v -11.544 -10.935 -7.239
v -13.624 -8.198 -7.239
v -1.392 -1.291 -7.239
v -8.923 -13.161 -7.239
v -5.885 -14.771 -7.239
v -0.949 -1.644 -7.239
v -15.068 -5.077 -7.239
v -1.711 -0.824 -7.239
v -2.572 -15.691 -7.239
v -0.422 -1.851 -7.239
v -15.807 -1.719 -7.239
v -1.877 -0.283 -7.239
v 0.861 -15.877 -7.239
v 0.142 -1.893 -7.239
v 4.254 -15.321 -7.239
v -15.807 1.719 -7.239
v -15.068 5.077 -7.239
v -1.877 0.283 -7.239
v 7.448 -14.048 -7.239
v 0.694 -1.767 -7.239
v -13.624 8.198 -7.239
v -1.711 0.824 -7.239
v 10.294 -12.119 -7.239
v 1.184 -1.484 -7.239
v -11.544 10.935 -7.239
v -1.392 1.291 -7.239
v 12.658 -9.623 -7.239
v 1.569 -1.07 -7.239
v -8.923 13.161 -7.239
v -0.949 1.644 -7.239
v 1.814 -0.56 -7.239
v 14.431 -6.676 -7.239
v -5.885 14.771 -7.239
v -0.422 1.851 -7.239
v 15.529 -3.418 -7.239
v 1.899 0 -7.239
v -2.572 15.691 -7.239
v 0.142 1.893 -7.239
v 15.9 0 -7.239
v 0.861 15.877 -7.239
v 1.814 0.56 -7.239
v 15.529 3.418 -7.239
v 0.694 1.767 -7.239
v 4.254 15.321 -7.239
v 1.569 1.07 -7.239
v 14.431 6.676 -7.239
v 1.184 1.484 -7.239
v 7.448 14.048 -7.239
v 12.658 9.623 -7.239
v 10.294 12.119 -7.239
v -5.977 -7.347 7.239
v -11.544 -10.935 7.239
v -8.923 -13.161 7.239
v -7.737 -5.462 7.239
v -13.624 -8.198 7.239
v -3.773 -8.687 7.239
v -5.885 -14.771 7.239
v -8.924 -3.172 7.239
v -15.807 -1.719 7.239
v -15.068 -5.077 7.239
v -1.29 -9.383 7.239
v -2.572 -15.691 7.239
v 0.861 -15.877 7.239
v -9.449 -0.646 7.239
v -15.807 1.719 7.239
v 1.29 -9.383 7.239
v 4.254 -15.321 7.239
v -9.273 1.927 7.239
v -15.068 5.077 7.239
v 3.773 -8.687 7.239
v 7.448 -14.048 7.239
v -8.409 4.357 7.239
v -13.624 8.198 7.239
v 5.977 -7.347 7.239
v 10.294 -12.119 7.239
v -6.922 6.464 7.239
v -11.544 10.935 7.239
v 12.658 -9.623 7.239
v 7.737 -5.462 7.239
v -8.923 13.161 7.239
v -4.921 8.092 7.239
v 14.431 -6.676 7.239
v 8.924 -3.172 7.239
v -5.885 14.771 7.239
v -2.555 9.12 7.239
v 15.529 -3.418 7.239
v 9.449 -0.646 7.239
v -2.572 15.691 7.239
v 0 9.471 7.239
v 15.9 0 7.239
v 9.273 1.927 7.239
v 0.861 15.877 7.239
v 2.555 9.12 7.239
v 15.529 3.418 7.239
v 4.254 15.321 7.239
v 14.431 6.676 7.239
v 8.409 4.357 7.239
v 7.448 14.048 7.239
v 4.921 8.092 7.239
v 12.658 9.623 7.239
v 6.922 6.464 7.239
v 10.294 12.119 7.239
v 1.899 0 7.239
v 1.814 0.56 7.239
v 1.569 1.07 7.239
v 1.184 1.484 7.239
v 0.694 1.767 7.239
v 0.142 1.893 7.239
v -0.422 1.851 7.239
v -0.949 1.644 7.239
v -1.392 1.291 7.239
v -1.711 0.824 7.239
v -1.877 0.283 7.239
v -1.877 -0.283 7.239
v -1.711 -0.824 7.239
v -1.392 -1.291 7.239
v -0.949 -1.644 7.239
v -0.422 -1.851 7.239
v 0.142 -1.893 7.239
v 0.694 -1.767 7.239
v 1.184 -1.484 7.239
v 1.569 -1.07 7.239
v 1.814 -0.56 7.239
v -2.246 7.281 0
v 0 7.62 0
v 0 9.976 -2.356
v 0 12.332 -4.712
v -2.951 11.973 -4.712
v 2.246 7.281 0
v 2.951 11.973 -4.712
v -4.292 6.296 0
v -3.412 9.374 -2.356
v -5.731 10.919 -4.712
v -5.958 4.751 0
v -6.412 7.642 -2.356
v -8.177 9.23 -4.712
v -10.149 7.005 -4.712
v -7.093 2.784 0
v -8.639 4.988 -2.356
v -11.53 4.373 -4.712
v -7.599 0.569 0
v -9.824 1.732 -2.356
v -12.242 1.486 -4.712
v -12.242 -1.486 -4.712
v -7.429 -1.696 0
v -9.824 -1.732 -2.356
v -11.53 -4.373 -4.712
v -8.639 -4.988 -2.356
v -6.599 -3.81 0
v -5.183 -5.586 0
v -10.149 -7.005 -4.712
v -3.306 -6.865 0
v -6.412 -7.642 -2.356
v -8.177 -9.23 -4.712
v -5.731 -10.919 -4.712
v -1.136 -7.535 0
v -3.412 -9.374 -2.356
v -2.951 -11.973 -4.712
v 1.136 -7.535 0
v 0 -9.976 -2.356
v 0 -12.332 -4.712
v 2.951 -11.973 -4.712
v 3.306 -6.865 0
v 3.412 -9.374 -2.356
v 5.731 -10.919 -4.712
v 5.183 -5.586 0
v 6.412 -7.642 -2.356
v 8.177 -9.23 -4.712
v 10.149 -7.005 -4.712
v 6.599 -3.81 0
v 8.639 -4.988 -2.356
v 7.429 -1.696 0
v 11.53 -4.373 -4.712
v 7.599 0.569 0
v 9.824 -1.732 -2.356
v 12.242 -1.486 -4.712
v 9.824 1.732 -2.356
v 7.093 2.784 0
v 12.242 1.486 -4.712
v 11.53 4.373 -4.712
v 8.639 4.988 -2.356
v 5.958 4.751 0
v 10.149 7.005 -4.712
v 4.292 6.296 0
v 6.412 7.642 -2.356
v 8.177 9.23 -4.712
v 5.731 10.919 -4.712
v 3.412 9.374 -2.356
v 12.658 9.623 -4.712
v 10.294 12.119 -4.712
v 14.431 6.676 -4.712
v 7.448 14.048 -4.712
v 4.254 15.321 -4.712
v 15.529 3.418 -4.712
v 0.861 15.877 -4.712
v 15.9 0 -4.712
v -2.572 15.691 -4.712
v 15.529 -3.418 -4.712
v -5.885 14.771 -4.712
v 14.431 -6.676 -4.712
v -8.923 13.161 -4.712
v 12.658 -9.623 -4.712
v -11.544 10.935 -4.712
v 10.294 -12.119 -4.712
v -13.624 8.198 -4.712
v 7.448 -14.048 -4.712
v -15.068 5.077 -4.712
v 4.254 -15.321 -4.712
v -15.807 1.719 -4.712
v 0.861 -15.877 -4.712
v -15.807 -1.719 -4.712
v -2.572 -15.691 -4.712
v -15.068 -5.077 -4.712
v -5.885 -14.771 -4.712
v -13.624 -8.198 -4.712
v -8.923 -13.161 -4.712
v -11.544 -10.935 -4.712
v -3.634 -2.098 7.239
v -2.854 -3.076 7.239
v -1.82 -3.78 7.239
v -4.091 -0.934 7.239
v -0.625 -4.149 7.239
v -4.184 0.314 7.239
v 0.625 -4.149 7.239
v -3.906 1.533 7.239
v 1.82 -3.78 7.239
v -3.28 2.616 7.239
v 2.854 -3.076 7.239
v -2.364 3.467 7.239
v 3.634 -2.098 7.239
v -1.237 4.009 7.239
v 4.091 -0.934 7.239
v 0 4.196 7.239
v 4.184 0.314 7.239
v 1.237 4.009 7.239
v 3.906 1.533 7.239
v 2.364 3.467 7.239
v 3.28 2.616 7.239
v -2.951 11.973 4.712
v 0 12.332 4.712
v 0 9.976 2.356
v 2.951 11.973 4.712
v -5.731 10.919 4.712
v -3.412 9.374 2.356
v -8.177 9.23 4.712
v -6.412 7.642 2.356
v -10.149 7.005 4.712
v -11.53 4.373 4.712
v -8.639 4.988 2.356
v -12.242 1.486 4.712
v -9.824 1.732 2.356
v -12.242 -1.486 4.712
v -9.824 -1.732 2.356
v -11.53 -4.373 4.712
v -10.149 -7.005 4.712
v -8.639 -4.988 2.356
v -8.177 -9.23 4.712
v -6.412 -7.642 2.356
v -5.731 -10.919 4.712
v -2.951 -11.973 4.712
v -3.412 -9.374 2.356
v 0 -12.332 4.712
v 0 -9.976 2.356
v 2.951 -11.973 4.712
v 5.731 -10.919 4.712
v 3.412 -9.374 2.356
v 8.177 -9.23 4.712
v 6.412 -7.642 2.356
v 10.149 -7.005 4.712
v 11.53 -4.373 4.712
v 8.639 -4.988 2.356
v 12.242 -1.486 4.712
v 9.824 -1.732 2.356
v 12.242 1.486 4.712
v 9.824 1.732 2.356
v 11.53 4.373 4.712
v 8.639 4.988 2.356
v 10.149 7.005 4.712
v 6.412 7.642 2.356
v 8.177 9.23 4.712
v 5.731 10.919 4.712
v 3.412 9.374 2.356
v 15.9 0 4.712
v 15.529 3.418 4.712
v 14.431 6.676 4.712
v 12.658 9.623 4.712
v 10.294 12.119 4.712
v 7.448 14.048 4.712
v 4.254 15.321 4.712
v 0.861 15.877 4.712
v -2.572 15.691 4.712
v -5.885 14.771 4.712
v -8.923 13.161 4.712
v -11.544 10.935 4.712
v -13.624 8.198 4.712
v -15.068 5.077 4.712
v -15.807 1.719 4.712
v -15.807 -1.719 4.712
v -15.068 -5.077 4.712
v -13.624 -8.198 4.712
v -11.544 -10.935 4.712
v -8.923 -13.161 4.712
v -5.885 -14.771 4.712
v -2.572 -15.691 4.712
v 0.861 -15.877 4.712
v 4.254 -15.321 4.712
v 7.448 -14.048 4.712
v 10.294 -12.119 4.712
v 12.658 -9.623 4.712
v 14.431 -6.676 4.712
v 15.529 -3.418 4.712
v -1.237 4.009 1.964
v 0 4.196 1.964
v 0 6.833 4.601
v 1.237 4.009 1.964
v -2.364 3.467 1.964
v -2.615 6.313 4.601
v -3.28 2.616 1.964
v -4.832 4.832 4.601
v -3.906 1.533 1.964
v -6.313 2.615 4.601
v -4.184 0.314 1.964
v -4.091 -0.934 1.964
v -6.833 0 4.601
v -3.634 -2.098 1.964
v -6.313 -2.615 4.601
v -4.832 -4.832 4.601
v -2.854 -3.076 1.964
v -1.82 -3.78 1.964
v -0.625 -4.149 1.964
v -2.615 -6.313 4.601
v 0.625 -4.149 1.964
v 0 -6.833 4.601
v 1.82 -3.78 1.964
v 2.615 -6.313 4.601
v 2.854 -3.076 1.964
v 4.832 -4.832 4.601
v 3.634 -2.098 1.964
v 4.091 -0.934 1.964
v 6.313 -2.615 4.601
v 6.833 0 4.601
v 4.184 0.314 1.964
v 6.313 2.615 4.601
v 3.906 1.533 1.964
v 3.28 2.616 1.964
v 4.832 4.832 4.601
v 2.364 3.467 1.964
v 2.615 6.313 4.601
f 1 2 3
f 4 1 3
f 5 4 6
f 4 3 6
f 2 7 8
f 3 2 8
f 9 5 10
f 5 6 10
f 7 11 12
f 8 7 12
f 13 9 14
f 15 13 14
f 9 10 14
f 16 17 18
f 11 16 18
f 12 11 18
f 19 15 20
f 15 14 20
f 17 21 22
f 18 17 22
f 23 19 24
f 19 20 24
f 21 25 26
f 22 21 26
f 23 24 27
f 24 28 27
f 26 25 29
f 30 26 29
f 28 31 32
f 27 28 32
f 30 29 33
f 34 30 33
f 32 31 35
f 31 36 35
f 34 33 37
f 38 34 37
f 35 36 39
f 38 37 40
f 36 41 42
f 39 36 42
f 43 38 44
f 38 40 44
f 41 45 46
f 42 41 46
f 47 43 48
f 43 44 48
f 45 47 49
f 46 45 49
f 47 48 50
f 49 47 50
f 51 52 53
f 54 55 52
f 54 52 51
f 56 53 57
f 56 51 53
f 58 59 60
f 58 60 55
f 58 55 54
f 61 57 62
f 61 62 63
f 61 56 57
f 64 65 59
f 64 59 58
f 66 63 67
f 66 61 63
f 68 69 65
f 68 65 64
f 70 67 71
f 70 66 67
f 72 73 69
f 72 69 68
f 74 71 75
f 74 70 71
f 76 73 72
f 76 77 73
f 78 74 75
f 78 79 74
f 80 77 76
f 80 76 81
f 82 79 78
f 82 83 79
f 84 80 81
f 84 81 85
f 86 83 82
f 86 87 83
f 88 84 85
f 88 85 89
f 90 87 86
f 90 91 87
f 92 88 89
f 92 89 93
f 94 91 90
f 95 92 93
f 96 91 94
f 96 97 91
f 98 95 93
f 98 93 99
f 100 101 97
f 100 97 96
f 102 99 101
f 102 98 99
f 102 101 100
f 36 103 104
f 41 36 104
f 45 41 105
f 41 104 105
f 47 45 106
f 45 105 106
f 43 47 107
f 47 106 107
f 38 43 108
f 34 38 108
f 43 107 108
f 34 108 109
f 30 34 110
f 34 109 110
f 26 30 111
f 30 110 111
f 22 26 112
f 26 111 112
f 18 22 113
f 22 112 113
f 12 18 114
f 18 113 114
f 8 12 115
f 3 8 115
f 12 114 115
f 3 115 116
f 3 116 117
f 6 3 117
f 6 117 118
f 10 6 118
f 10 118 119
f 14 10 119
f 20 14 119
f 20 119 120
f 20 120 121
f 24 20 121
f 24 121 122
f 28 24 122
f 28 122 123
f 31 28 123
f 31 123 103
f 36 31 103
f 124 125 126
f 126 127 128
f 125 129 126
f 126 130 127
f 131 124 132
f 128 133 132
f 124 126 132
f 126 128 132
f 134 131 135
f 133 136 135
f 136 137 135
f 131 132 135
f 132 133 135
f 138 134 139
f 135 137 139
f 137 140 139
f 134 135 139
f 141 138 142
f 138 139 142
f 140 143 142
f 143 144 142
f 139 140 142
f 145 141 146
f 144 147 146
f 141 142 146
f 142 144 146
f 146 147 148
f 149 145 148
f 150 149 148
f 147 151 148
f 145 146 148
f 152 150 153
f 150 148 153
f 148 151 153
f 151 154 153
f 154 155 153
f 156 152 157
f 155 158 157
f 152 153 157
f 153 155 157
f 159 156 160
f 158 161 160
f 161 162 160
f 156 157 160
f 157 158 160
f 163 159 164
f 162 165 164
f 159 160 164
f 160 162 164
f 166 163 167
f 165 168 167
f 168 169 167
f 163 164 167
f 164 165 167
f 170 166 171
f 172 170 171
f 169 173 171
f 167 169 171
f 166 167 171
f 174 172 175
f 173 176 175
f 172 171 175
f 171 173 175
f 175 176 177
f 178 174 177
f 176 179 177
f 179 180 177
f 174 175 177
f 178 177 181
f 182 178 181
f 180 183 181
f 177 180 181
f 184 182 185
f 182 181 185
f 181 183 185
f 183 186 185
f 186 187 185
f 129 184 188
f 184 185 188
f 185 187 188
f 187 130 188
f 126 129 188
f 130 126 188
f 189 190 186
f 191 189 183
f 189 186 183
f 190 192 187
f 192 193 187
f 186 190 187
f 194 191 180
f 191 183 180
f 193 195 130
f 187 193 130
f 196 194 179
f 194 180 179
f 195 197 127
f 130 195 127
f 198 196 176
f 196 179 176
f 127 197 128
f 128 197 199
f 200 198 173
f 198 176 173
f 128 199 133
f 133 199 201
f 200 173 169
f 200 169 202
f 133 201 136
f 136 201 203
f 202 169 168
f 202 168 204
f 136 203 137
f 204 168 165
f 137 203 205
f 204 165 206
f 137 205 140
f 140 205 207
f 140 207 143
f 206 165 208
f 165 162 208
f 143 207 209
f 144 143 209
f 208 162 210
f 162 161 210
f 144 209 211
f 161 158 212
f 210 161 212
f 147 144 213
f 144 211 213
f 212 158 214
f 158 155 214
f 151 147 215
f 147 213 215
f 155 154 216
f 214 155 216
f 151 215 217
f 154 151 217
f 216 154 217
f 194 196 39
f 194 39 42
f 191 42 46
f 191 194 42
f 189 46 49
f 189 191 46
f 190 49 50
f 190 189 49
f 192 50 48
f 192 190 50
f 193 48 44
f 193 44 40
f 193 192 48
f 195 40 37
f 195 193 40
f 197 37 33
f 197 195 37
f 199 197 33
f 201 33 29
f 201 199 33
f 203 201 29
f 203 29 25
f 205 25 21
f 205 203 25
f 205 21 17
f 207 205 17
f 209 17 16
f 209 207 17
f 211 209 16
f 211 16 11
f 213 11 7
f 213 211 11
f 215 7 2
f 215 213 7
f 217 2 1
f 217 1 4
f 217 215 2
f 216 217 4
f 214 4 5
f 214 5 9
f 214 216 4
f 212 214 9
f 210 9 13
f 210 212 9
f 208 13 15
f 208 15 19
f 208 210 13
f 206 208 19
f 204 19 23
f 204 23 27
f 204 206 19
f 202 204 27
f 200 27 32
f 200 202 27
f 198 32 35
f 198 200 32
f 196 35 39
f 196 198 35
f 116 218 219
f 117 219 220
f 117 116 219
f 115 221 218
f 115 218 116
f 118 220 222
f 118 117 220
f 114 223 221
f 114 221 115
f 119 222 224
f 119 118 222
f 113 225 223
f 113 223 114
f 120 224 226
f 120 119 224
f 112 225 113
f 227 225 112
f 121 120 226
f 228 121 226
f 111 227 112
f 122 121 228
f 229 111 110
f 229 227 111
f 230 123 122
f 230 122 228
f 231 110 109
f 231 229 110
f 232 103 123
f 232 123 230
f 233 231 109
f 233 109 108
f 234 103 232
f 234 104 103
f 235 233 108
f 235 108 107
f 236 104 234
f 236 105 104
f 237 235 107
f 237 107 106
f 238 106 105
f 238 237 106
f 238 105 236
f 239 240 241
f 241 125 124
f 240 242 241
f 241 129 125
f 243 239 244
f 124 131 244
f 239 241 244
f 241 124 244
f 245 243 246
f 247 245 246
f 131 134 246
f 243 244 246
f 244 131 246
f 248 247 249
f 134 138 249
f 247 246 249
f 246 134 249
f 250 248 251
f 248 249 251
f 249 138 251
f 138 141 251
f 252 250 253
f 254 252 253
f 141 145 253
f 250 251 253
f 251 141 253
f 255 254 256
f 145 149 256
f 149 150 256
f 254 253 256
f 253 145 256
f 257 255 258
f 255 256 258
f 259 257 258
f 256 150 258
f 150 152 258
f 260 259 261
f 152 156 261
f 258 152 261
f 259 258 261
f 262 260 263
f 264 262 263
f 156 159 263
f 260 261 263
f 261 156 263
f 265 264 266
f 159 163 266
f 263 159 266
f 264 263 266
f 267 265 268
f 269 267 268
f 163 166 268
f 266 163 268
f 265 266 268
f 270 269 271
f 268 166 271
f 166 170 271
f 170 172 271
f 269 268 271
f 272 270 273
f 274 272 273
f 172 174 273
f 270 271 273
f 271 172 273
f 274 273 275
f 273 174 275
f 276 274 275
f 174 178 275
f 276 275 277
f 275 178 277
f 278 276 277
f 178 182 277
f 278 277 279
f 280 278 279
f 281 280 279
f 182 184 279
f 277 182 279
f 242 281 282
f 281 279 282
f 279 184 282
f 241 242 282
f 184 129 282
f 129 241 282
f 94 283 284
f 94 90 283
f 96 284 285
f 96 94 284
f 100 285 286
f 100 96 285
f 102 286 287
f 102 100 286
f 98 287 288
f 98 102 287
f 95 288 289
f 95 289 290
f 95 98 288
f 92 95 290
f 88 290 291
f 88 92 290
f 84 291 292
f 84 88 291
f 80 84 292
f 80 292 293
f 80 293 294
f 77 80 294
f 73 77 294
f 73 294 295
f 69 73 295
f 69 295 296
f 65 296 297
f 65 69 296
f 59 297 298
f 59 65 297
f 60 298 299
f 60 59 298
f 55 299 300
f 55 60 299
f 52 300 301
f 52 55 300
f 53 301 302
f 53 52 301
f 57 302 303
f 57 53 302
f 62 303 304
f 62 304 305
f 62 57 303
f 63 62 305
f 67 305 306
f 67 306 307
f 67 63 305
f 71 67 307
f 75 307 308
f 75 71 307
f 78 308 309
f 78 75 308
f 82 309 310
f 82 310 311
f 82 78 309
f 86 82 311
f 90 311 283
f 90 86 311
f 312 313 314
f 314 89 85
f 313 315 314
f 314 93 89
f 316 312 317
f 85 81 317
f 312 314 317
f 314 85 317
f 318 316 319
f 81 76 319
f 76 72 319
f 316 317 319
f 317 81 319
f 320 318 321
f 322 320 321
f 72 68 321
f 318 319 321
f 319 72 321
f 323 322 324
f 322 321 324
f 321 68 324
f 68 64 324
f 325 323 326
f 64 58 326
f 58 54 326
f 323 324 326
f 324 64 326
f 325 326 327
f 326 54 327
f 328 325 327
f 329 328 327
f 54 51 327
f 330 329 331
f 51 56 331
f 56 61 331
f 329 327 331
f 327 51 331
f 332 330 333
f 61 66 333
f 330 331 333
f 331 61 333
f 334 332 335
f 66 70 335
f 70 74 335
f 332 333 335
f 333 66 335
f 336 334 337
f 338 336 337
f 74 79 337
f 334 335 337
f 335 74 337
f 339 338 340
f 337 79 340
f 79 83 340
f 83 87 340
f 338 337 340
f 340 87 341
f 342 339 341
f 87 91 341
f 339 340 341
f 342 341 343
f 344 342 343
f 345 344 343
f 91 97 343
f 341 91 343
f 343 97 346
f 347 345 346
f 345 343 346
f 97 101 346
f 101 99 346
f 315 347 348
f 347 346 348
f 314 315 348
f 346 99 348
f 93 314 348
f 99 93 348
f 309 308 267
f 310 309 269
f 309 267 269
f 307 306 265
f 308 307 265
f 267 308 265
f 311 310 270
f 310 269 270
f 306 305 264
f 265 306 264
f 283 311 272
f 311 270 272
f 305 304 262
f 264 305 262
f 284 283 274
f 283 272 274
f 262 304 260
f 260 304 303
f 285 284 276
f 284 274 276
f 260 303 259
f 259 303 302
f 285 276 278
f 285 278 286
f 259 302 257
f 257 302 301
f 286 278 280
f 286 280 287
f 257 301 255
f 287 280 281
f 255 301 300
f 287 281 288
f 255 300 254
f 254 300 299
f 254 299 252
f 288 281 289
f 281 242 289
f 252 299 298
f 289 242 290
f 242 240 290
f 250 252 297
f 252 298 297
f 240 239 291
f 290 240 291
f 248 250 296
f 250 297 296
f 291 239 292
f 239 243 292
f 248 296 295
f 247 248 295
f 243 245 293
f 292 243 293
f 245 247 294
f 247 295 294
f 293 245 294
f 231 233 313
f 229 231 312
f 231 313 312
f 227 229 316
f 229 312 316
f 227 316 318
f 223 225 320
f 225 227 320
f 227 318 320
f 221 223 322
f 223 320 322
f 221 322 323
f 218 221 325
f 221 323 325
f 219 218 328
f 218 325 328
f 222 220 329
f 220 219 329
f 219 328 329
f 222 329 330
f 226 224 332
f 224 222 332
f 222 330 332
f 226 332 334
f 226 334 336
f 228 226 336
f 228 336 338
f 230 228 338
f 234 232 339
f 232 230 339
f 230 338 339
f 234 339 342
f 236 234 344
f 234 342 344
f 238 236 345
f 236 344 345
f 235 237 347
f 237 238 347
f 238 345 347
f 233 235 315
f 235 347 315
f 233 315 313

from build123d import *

# Parameters (mm, degrees)
F0_R     = 15.9004
F1_DEPTH = 7.239
F2_R     = 1.89865
F3_DEPTH = 14.479


with BuildPart() as f1:
    # F0 (on Top) → F1 (new body, symmetric)
    with BuildSketch(Plane.XY):
        Circle(F0_R)
    extrude(amount=F1_DEPTH, both=True)

    # F2 (on face) → F3 (cut, through all)
    with BuildSketch(Plane.XY.offset(7.239)):
        Circle(F2_R)
    extrude(amount=-F3_DEPTH, mode=Mode.SUBTRACT)

    # F4 (on Right) → F5 (revolve, cut)
    with BuildSketch(Plane.YZ):
        Polygon((20.401963, -4.7117), (20.401963, 4.7117), (12.3317, 4.7117), (7.62, 0), (12.3317, -4.7117), align=None)
        Polygon((11.294965, 9.063118), (4.195787, 9.063118), (4.195787, 1.963941), align=None)
    revolve(axis=Axis((0, 0, 4.896712), (0, 0, 1)), mode=Mode.SUBTRACT)


solid = f1.part
